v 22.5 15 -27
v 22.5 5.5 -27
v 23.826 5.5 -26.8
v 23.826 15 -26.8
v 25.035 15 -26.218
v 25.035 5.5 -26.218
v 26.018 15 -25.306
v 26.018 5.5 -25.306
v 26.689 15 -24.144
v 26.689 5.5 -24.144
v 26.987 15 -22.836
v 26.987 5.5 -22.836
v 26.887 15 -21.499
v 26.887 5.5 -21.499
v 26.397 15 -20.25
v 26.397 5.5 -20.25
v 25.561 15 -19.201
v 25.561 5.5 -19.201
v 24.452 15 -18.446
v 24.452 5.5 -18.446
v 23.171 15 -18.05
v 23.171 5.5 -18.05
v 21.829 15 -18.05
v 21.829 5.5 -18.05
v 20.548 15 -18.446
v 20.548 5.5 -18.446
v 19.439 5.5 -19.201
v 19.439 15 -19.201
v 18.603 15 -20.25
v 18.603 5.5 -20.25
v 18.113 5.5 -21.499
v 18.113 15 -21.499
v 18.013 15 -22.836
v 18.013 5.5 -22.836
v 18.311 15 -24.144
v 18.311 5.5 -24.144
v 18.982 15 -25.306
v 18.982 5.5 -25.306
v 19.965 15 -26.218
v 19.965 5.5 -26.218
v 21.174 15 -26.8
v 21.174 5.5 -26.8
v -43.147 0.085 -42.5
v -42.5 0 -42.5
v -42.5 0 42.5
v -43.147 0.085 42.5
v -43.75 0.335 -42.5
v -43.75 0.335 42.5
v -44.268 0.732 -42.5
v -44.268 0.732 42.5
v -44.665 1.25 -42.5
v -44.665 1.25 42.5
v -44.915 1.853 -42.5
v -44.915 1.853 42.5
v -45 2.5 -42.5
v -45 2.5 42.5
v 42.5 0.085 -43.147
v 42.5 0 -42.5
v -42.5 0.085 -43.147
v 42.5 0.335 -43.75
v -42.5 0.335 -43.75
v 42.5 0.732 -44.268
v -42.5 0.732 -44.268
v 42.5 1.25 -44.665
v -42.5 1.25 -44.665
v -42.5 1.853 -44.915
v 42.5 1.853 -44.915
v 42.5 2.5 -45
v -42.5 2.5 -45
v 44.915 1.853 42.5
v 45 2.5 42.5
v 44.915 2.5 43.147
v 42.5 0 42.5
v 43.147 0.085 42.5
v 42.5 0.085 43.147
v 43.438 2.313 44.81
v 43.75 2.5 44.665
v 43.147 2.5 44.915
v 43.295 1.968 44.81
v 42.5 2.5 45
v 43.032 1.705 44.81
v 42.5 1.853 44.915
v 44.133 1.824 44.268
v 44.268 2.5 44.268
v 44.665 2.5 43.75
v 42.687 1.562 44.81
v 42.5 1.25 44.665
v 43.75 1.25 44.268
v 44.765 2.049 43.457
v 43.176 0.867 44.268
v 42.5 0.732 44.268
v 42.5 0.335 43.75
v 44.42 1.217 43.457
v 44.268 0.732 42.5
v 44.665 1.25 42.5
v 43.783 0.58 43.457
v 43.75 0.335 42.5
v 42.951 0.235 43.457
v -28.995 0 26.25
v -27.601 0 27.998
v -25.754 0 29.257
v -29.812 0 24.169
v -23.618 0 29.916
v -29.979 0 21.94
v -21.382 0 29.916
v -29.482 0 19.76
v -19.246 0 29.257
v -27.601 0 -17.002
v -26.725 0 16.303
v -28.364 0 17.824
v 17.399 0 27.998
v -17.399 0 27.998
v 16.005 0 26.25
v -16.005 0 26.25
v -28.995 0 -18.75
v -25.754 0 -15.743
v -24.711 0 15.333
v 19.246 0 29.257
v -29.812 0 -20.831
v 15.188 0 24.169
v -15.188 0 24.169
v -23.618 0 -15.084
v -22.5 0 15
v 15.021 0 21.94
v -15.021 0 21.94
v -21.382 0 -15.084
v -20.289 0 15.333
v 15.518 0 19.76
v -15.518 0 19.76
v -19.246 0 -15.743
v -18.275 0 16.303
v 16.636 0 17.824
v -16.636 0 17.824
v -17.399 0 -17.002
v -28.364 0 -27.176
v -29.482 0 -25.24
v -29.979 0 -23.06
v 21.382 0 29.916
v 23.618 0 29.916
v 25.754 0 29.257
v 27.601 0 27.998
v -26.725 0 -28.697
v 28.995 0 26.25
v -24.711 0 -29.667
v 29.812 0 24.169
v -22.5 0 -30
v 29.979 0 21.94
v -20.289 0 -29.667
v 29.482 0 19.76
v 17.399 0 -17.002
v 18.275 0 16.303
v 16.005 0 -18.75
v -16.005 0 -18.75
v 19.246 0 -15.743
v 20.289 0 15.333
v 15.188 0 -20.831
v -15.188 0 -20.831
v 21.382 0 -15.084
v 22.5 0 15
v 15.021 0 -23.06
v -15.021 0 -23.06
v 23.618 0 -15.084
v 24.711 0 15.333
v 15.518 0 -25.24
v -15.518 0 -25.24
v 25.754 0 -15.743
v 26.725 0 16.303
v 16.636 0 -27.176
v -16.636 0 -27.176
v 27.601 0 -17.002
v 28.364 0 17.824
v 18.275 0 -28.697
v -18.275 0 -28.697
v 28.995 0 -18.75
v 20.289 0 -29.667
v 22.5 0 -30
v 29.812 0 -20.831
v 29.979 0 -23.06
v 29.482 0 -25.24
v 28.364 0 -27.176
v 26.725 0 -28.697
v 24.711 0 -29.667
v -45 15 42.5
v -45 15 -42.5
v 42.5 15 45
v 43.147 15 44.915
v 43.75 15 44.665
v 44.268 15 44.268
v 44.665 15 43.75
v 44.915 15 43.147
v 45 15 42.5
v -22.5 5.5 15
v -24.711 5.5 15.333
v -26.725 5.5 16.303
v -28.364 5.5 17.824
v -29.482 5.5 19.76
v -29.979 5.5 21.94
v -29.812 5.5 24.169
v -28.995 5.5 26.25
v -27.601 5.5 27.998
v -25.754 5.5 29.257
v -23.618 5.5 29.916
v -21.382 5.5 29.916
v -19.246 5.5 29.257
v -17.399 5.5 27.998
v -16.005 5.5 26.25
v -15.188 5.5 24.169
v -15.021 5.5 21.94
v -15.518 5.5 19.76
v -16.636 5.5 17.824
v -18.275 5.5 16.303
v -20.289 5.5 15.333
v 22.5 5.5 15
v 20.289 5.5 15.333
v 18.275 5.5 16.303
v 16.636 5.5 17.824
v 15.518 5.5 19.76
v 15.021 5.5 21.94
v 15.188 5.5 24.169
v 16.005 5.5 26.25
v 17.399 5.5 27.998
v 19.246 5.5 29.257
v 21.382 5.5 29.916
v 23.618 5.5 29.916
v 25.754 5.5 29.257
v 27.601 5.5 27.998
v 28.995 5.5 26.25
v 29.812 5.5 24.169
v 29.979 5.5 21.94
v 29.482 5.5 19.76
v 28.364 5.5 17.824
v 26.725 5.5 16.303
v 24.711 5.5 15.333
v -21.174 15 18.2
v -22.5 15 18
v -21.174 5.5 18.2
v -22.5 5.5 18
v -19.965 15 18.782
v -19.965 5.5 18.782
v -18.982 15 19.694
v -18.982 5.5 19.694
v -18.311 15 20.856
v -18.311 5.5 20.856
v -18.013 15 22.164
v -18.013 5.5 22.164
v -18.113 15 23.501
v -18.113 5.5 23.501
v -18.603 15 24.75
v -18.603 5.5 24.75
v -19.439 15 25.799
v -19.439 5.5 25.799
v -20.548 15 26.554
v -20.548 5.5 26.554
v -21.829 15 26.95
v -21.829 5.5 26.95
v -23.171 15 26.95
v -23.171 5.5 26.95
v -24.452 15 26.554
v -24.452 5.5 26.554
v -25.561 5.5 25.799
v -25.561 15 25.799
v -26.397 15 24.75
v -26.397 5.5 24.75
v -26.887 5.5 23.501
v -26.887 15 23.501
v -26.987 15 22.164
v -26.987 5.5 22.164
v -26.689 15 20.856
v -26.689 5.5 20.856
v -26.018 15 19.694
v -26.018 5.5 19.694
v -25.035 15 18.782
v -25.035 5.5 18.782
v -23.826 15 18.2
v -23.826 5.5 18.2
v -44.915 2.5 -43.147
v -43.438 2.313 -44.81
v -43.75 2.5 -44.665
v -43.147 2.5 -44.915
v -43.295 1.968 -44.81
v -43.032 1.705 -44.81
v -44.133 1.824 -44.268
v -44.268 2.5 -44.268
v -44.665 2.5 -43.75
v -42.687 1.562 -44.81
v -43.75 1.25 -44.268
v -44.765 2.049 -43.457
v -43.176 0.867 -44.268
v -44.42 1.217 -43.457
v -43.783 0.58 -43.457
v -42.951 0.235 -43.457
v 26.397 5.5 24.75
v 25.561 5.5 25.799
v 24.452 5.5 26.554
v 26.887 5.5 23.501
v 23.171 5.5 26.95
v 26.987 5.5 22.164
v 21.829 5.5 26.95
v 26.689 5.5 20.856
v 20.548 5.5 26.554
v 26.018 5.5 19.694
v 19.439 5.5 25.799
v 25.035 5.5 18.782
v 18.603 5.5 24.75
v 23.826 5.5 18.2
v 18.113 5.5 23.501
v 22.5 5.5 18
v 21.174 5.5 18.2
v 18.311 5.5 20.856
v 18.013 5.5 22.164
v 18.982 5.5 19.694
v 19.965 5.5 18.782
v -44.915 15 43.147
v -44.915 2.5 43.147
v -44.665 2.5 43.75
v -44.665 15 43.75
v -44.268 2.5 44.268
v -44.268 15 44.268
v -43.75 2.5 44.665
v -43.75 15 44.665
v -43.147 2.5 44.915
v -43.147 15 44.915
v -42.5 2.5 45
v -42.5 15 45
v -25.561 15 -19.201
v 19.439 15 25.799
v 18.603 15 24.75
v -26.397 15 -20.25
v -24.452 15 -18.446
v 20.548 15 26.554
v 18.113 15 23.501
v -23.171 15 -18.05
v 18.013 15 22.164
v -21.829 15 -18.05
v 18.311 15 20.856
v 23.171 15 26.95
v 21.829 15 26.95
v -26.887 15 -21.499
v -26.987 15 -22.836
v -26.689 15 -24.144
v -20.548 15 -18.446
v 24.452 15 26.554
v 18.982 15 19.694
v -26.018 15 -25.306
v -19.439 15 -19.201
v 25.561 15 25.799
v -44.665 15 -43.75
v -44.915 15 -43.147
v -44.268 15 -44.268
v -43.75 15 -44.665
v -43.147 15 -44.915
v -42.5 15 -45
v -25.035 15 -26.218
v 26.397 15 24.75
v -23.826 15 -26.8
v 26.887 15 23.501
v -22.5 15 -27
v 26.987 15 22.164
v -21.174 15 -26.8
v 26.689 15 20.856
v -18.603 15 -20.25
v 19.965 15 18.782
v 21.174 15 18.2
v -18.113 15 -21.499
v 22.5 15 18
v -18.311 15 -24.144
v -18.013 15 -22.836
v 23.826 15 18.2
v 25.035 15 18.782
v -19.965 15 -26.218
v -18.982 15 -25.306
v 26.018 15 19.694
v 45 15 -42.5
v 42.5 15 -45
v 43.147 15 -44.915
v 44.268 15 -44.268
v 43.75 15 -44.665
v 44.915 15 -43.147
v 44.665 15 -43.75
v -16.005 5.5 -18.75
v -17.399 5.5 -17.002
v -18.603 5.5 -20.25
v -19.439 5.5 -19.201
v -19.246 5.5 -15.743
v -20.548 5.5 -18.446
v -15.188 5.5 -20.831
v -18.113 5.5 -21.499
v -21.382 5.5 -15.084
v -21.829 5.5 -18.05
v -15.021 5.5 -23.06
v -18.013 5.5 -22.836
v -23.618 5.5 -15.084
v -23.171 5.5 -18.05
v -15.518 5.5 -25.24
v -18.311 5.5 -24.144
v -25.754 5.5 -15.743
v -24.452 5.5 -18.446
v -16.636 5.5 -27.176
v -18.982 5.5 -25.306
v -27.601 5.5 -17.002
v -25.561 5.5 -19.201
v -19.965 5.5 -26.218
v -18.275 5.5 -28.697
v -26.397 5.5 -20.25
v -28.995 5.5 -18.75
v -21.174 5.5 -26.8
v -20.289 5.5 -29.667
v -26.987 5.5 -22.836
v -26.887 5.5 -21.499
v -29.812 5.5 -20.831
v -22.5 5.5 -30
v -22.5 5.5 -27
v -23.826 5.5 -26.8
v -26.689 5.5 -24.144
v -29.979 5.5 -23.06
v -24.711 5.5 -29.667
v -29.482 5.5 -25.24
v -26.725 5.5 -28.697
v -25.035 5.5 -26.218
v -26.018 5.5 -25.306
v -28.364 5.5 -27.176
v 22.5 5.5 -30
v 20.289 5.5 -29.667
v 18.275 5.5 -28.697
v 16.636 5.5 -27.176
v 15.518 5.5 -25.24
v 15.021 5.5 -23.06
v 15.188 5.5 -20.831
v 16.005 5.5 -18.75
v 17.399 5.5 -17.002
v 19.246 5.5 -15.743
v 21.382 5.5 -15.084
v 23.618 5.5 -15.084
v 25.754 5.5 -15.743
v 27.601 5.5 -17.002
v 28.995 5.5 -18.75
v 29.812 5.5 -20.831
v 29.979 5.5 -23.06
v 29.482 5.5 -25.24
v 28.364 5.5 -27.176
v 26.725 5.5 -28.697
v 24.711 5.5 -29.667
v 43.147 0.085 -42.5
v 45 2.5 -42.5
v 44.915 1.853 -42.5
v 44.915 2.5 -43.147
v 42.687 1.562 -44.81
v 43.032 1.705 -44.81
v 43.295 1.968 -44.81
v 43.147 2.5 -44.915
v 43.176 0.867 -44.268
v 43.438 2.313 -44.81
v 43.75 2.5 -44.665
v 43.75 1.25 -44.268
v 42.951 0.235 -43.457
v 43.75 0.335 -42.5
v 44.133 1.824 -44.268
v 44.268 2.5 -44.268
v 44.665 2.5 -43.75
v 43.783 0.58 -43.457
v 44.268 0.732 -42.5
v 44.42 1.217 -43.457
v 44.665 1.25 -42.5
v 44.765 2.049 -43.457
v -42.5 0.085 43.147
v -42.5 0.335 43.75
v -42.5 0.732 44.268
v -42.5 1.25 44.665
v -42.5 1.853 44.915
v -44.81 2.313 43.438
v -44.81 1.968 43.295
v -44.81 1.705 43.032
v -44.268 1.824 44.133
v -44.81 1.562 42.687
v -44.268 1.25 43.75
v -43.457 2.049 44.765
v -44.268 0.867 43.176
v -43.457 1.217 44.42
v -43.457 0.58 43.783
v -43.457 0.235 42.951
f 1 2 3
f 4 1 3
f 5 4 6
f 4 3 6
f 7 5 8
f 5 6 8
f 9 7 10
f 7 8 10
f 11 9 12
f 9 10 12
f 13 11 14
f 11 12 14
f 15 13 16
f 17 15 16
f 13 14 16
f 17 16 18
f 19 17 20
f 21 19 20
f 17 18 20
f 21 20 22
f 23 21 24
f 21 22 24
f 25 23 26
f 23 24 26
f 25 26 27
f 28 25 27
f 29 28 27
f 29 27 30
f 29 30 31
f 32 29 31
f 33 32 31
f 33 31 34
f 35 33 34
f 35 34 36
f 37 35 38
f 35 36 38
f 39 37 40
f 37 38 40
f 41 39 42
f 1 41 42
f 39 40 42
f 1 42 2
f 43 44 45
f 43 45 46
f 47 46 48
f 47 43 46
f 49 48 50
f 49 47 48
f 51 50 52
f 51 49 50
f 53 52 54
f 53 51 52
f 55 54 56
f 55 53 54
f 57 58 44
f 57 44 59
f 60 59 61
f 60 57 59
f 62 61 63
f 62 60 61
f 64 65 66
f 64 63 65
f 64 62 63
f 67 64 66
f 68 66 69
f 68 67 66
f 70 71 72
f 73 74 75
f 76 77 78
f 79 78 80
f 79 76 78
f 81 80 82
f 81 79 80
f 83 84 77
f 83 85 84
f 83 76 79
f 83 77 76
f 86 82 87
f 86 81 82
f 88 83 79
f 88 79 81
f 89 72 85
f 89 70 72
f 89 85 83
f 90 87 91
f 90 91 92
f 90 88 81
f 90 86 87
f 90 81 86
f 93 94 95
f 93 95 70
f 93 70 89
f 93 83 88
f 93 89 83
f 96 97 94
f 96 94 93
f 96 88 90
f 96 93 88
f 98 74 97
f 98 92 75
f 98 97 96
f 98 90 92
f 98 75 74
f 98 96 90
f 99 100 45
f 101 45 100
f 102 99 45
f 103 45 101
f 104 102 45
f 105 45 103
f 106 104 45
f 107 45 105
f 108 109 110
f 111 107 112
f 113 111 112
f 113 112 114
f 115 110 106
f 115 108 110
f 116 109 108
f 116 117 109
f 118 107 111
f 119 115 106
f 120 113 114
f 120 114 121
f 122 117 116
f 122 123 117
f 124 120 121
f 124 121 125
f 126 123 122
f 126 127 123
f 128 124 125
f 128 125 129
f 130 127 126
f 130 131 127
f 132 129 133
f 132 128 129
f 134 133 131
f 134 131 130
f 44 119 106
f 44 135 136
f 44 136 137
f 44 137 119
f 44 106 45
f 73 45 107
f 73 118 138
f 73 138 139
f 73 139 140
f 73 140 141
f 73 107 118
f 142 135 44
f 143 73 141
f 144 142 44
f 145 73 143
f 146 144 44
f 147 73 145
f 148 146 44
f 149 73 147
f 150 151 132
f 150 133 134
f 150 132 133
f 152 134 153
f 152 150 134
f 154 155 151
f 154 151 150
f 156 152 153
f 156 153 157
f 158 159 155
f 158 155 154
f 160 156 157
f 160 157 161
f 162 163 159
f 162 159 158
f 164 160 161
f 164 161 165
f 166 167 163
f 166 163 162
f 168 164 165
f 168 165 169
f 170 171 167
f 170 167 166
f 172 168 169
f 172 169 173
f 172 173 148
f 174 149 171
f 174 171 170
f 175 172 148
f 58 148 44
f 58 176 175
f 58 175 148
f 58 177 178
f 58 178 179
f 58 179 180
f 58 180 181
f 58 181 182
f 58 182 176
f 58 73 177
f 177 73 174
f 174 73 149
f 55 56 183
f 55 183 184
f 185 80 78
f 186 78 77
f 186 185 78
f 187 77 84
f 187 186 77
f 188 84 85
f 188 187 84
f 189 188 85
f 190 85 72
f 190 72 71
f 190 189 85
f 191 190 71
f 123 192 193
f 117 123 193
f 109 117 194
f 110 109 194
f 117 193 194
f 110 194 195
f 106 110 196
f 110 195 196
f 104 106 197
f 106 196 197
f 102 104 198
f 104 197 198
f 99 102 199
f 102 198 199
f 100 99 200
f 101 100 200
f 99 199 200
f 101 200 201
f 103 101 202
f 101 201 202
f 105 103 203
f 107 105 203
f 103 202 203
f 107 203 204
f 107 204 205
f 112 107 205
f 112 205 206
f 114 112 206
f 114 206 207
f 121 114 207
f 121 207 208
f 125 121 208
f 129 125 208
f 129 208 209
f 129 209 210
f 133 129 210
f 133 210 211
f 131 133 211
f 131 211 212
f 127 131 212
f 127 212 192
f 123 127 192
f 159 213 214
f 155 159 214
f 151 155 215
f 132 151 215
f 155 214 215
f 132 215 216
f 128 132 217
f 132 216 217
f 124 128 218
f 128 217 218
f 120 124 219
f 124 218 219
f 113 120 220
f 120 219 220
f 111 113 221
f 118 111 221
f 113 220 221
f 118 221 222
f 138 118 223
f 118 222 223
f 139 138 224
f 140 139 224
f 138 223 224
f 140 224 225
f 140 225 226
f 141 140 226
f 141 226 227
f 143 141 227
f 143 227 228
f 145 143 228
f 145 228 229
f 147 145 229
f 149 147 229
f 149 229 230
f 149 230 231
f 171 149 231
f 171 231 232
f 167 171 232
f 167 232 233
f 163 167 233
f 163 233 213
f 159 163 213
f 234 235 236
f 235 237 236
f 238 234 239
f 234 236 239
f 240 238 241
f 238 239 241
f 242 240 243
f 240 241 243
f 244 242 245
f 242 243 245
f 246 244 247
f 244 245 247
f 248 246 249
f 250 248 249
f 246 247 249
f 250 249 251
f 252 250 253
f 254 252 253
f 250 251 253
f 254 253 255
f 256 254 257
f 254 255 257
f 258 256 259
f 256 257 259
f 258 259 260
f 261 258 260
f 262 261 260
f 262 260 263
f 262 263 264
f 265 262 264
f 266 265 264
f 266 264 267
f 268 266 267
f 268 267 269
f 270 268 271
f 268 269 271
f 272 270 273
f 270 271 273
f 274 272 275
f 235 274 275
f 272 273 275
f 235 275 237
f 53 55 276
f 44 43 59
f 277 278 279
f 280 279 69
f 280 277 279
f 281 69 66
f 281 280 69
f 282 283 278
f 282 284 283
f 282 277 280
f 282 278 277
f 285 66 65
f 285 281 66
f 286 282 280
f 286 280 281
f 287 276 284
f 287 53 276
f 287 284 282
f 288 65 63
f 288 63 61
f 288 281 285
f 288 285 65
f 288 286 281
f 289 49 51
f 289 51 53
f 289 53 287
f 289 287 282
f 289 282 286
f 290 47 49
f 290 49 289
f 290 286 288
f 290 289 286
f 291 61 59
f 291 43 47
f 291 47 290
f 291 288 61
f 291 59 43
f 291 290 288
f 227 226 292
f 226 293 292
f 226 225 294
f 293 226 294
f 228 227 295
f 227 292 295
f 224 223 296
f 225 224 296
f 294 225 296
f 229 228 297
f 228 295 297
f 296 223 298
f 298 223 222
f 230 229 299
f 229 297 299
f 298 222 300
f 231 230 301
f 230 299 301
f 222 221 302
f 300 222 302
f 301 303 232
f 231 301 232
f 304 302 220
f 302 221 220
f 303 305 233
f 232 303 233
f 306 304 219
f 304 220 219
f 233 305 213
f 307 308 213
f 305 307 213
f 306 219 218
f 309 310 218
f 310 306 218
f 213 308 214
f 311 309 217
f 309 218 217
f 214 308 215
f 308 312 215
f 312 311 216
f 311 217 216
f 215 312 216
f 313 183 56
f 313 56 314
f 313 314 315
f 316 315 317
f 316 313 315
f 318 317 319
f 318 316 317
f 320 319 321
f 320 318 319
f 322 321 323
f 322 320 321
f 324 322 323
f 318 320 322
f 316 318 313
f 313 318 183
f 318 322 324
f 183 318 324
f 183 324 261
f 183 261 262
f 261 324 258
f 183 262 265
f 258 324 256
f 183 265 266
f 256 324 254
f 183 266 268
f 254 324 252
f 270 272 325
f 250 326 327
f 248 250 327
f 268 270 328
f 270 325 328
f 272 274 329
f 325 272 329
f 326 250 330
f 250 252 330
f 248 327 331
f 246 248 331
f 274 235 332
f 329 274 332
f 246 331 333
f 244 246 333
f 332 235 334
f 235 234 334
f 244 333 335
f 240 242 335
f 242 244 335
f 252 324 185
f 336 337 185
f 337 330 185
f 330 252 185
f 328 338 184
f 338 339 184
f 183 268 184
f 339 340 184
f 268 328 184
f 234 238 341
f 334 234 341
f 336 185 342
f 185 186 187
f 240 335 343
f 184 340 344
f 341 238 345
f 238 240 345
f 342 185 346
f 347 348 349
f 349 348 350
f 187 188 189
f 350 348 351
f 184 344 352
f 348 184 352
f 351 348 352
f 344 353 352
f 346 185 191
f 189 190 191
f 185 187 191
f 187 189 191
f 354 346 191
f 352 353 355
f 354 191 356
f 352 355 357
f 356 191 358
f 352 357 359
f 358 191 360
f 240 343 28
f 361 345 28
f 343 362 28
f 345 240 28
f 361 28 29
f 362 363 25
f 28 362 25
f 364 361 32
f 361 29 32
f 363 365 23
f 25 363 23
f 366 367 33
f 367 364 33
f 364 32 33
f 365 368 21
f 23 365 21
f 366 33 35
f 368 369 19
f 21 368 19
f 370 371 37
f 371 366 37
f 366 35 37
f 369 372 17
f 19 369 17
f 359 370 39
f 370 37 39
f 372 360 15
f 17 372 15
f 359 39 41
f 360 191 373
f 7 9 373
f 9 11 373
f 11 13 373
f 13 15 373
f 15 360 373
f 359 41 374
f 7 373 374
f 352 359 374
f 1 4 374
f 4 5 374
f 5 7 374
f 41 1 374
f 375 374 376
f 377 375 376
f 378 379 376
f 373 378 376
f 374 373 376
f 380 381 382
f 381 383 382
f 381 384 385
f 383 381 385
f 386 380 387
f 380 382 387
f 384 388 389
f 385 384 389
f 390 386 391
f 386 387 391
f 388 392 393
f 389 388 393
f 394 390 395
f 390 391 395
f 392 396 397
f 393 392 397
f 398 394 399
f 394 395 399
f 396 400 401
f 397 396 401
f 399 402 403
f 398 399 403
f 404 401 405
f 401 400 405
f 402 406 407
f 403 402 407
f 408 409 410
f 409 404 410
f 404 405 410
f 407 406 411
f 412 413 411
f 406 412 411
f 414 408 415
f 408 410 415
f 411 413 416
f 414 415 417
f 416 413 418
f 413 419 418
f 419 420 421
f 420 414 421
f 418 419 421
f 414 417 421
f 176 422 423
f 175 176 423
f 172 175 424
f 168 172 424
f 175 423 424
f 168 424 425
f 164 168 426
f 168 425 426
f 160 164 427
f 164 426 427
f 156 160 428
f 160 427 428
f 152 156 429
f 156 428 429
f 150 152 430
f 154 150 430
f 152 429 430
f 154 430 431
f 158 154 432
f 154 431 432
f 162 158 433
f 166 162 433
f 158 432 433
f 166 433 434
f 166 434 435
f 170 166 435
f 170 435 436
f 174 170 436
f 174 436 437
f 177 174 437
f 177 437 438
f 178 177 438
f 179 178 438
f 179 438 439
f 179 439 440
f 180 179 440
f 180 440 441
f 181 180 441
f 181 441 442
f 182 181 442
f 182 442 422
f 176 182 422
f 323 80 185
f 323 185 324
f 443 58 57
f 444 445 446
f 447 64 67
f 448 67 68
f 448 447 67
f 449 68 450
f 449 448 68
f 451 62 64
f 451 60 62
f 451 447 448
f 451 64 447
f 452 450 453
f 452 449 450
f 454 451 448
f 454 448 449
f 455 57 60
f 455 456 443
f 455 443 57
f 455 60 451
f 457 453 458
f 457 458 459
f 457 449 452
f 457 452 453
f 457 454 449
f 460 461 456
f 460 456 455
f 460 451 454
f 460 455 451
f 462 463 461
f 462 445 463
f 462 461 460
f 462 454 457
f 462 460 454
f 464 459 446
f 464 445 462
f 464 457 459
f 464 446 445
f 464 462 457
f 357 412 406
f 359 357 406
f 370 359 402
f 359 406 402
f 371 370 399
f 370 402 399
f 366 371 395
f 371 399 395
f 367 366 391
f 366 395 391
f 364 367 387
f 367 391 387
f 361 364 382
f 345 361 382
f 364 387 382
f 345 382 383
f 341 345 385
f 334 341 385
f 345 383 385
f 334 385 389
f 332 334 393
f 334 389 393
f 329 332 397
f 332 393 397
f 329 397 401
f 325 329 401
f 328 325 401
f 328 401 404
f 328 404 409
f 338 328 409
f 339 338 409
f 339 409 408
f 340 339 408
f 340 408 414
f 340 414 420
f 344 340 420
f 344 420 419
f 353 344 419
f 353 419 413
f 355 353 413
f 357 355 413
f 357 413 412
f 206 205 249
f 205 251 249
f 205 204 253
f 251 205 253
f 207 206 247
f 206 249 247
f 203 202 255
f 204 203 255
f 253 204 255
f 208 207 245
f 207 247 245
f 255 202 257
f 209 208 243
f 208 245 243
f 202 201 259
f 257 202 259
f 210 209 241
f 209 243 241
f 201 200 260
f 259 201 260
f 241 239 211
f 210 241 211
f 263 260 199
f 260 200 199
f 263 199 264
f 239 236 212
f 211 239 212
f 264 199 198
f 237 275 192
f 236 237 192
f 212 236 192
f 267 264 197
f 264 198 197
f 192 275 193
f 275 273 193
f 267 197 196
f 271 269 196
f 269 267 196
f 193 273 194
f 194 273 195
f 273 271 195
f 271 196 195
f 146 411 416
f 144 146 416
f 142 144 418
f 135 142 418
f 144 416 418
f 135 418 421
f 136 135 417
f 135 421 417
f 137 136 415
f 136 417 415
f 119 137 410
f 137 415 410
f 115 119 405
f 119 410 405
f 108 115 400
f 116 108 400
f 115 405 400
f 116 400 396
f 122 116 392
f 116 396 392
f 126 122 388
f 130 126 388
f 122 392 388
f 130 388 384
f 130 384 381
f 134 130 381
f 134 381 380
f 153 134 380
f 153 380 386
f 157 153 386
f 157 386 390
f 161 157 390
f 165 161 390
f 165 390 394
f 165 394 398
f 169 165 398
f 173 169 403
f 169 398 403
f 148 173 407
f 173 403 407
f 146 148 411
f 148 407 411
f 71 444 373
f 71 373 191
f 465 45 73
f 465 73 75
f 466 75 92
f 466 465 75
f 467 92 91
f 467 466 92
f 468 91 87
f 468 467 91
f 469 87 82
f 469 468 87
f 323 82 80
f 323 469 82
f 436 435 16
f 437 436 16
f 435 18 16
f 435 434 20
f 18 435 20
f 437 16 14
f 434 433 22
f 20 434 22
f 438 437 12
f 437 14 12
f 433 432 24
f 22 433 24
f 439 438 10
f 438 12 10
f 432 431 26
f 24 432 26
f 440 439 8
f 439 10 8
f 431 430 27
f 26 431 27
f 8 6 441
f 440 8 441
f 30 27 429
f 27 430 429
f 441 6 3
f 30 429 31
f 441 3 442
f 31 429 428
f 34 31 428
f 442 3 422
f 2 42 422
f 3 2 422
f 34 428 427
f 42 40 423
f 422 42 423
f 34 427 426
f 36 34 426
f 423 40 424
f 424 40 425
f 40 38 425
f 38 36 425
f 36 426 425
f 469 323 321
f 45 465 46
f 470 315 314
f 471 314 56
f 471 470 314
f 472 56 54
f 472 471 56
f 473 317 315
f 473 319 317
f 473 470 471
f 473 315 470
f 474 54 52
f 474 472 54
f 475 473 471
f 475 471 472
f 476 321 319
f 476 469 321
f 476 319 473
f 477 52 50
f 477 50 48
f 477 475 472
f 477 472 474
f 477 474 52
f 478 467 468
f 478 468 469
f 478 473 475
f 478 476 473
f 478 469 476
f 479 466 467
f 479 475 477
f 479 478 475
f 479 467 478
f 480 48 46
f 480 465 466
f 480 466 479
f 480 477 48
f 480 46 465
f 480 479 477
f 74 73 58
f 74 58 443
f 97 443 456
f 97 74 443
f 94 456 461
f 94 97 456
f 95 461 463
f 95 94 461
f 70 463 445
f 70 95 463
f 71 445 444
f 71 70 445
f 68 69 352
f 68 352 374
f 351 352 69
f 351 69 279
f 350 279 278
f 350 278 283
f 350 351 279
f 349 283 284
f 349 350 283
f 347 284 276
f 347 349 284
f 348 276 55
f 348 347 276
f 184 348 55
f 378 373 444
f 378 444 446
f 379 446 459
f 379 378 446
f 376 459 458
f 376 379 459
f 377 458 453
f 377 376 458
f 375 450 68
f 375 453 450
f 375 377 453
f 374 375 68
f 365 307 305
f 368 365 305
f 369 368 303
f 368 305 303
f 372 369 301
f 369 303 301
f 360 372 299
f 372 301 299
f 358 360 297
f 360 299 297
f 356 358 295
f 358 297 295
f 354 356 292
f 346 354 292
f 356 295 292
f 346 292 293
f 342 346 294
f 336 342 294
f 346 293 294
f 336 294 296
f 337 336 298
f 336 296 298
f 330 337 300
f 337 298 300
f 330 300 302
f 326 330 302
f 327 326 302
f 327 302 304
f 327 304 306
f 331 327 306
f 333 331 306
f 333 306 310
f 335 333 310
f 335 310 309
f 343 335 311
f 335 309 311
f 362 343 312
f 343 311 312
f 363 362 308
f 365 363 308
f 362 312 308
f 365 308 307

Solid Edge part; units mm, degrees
sketch "Sketch1" plane through (0, 0, 0) normal (0, -1, 0) x (1, 0, 0)
  line L0 (45, 45) -> (-45, 45)
  line L1 (-45, 45) -> (-45, -45)
  line L2 (-45, -45) -> (45, -45)
  line L3 (45, -45) -> (45, 45)
  dimension "D1" = 90
extrude "Protrusion1" add sketch "Sketch1" against normal blind 15
fillet "Redondeo_1" radius 2.5 8 edges at (45, 0, 0) (0, 0, 45) (-45, 0, 0) (0, 0, -45) (45, 7.5, 45) (45, 7.5, -45) (-45, 7.5, -45) (-45, 7.5, 45)
hole "Agujero_1" at (-22.5, 0, 22.5) direction (0, 1, 0) diameter 9 end up to next counterbore diameter 15 counterbore depth 5.5
pattern_linear "Pattern1" count 2 spacing 45 along (1, 0, 0) count 2 spacing 45 along (0, 0, -1) of "Agujero_1"
properties part number "1983-1100-C03"
